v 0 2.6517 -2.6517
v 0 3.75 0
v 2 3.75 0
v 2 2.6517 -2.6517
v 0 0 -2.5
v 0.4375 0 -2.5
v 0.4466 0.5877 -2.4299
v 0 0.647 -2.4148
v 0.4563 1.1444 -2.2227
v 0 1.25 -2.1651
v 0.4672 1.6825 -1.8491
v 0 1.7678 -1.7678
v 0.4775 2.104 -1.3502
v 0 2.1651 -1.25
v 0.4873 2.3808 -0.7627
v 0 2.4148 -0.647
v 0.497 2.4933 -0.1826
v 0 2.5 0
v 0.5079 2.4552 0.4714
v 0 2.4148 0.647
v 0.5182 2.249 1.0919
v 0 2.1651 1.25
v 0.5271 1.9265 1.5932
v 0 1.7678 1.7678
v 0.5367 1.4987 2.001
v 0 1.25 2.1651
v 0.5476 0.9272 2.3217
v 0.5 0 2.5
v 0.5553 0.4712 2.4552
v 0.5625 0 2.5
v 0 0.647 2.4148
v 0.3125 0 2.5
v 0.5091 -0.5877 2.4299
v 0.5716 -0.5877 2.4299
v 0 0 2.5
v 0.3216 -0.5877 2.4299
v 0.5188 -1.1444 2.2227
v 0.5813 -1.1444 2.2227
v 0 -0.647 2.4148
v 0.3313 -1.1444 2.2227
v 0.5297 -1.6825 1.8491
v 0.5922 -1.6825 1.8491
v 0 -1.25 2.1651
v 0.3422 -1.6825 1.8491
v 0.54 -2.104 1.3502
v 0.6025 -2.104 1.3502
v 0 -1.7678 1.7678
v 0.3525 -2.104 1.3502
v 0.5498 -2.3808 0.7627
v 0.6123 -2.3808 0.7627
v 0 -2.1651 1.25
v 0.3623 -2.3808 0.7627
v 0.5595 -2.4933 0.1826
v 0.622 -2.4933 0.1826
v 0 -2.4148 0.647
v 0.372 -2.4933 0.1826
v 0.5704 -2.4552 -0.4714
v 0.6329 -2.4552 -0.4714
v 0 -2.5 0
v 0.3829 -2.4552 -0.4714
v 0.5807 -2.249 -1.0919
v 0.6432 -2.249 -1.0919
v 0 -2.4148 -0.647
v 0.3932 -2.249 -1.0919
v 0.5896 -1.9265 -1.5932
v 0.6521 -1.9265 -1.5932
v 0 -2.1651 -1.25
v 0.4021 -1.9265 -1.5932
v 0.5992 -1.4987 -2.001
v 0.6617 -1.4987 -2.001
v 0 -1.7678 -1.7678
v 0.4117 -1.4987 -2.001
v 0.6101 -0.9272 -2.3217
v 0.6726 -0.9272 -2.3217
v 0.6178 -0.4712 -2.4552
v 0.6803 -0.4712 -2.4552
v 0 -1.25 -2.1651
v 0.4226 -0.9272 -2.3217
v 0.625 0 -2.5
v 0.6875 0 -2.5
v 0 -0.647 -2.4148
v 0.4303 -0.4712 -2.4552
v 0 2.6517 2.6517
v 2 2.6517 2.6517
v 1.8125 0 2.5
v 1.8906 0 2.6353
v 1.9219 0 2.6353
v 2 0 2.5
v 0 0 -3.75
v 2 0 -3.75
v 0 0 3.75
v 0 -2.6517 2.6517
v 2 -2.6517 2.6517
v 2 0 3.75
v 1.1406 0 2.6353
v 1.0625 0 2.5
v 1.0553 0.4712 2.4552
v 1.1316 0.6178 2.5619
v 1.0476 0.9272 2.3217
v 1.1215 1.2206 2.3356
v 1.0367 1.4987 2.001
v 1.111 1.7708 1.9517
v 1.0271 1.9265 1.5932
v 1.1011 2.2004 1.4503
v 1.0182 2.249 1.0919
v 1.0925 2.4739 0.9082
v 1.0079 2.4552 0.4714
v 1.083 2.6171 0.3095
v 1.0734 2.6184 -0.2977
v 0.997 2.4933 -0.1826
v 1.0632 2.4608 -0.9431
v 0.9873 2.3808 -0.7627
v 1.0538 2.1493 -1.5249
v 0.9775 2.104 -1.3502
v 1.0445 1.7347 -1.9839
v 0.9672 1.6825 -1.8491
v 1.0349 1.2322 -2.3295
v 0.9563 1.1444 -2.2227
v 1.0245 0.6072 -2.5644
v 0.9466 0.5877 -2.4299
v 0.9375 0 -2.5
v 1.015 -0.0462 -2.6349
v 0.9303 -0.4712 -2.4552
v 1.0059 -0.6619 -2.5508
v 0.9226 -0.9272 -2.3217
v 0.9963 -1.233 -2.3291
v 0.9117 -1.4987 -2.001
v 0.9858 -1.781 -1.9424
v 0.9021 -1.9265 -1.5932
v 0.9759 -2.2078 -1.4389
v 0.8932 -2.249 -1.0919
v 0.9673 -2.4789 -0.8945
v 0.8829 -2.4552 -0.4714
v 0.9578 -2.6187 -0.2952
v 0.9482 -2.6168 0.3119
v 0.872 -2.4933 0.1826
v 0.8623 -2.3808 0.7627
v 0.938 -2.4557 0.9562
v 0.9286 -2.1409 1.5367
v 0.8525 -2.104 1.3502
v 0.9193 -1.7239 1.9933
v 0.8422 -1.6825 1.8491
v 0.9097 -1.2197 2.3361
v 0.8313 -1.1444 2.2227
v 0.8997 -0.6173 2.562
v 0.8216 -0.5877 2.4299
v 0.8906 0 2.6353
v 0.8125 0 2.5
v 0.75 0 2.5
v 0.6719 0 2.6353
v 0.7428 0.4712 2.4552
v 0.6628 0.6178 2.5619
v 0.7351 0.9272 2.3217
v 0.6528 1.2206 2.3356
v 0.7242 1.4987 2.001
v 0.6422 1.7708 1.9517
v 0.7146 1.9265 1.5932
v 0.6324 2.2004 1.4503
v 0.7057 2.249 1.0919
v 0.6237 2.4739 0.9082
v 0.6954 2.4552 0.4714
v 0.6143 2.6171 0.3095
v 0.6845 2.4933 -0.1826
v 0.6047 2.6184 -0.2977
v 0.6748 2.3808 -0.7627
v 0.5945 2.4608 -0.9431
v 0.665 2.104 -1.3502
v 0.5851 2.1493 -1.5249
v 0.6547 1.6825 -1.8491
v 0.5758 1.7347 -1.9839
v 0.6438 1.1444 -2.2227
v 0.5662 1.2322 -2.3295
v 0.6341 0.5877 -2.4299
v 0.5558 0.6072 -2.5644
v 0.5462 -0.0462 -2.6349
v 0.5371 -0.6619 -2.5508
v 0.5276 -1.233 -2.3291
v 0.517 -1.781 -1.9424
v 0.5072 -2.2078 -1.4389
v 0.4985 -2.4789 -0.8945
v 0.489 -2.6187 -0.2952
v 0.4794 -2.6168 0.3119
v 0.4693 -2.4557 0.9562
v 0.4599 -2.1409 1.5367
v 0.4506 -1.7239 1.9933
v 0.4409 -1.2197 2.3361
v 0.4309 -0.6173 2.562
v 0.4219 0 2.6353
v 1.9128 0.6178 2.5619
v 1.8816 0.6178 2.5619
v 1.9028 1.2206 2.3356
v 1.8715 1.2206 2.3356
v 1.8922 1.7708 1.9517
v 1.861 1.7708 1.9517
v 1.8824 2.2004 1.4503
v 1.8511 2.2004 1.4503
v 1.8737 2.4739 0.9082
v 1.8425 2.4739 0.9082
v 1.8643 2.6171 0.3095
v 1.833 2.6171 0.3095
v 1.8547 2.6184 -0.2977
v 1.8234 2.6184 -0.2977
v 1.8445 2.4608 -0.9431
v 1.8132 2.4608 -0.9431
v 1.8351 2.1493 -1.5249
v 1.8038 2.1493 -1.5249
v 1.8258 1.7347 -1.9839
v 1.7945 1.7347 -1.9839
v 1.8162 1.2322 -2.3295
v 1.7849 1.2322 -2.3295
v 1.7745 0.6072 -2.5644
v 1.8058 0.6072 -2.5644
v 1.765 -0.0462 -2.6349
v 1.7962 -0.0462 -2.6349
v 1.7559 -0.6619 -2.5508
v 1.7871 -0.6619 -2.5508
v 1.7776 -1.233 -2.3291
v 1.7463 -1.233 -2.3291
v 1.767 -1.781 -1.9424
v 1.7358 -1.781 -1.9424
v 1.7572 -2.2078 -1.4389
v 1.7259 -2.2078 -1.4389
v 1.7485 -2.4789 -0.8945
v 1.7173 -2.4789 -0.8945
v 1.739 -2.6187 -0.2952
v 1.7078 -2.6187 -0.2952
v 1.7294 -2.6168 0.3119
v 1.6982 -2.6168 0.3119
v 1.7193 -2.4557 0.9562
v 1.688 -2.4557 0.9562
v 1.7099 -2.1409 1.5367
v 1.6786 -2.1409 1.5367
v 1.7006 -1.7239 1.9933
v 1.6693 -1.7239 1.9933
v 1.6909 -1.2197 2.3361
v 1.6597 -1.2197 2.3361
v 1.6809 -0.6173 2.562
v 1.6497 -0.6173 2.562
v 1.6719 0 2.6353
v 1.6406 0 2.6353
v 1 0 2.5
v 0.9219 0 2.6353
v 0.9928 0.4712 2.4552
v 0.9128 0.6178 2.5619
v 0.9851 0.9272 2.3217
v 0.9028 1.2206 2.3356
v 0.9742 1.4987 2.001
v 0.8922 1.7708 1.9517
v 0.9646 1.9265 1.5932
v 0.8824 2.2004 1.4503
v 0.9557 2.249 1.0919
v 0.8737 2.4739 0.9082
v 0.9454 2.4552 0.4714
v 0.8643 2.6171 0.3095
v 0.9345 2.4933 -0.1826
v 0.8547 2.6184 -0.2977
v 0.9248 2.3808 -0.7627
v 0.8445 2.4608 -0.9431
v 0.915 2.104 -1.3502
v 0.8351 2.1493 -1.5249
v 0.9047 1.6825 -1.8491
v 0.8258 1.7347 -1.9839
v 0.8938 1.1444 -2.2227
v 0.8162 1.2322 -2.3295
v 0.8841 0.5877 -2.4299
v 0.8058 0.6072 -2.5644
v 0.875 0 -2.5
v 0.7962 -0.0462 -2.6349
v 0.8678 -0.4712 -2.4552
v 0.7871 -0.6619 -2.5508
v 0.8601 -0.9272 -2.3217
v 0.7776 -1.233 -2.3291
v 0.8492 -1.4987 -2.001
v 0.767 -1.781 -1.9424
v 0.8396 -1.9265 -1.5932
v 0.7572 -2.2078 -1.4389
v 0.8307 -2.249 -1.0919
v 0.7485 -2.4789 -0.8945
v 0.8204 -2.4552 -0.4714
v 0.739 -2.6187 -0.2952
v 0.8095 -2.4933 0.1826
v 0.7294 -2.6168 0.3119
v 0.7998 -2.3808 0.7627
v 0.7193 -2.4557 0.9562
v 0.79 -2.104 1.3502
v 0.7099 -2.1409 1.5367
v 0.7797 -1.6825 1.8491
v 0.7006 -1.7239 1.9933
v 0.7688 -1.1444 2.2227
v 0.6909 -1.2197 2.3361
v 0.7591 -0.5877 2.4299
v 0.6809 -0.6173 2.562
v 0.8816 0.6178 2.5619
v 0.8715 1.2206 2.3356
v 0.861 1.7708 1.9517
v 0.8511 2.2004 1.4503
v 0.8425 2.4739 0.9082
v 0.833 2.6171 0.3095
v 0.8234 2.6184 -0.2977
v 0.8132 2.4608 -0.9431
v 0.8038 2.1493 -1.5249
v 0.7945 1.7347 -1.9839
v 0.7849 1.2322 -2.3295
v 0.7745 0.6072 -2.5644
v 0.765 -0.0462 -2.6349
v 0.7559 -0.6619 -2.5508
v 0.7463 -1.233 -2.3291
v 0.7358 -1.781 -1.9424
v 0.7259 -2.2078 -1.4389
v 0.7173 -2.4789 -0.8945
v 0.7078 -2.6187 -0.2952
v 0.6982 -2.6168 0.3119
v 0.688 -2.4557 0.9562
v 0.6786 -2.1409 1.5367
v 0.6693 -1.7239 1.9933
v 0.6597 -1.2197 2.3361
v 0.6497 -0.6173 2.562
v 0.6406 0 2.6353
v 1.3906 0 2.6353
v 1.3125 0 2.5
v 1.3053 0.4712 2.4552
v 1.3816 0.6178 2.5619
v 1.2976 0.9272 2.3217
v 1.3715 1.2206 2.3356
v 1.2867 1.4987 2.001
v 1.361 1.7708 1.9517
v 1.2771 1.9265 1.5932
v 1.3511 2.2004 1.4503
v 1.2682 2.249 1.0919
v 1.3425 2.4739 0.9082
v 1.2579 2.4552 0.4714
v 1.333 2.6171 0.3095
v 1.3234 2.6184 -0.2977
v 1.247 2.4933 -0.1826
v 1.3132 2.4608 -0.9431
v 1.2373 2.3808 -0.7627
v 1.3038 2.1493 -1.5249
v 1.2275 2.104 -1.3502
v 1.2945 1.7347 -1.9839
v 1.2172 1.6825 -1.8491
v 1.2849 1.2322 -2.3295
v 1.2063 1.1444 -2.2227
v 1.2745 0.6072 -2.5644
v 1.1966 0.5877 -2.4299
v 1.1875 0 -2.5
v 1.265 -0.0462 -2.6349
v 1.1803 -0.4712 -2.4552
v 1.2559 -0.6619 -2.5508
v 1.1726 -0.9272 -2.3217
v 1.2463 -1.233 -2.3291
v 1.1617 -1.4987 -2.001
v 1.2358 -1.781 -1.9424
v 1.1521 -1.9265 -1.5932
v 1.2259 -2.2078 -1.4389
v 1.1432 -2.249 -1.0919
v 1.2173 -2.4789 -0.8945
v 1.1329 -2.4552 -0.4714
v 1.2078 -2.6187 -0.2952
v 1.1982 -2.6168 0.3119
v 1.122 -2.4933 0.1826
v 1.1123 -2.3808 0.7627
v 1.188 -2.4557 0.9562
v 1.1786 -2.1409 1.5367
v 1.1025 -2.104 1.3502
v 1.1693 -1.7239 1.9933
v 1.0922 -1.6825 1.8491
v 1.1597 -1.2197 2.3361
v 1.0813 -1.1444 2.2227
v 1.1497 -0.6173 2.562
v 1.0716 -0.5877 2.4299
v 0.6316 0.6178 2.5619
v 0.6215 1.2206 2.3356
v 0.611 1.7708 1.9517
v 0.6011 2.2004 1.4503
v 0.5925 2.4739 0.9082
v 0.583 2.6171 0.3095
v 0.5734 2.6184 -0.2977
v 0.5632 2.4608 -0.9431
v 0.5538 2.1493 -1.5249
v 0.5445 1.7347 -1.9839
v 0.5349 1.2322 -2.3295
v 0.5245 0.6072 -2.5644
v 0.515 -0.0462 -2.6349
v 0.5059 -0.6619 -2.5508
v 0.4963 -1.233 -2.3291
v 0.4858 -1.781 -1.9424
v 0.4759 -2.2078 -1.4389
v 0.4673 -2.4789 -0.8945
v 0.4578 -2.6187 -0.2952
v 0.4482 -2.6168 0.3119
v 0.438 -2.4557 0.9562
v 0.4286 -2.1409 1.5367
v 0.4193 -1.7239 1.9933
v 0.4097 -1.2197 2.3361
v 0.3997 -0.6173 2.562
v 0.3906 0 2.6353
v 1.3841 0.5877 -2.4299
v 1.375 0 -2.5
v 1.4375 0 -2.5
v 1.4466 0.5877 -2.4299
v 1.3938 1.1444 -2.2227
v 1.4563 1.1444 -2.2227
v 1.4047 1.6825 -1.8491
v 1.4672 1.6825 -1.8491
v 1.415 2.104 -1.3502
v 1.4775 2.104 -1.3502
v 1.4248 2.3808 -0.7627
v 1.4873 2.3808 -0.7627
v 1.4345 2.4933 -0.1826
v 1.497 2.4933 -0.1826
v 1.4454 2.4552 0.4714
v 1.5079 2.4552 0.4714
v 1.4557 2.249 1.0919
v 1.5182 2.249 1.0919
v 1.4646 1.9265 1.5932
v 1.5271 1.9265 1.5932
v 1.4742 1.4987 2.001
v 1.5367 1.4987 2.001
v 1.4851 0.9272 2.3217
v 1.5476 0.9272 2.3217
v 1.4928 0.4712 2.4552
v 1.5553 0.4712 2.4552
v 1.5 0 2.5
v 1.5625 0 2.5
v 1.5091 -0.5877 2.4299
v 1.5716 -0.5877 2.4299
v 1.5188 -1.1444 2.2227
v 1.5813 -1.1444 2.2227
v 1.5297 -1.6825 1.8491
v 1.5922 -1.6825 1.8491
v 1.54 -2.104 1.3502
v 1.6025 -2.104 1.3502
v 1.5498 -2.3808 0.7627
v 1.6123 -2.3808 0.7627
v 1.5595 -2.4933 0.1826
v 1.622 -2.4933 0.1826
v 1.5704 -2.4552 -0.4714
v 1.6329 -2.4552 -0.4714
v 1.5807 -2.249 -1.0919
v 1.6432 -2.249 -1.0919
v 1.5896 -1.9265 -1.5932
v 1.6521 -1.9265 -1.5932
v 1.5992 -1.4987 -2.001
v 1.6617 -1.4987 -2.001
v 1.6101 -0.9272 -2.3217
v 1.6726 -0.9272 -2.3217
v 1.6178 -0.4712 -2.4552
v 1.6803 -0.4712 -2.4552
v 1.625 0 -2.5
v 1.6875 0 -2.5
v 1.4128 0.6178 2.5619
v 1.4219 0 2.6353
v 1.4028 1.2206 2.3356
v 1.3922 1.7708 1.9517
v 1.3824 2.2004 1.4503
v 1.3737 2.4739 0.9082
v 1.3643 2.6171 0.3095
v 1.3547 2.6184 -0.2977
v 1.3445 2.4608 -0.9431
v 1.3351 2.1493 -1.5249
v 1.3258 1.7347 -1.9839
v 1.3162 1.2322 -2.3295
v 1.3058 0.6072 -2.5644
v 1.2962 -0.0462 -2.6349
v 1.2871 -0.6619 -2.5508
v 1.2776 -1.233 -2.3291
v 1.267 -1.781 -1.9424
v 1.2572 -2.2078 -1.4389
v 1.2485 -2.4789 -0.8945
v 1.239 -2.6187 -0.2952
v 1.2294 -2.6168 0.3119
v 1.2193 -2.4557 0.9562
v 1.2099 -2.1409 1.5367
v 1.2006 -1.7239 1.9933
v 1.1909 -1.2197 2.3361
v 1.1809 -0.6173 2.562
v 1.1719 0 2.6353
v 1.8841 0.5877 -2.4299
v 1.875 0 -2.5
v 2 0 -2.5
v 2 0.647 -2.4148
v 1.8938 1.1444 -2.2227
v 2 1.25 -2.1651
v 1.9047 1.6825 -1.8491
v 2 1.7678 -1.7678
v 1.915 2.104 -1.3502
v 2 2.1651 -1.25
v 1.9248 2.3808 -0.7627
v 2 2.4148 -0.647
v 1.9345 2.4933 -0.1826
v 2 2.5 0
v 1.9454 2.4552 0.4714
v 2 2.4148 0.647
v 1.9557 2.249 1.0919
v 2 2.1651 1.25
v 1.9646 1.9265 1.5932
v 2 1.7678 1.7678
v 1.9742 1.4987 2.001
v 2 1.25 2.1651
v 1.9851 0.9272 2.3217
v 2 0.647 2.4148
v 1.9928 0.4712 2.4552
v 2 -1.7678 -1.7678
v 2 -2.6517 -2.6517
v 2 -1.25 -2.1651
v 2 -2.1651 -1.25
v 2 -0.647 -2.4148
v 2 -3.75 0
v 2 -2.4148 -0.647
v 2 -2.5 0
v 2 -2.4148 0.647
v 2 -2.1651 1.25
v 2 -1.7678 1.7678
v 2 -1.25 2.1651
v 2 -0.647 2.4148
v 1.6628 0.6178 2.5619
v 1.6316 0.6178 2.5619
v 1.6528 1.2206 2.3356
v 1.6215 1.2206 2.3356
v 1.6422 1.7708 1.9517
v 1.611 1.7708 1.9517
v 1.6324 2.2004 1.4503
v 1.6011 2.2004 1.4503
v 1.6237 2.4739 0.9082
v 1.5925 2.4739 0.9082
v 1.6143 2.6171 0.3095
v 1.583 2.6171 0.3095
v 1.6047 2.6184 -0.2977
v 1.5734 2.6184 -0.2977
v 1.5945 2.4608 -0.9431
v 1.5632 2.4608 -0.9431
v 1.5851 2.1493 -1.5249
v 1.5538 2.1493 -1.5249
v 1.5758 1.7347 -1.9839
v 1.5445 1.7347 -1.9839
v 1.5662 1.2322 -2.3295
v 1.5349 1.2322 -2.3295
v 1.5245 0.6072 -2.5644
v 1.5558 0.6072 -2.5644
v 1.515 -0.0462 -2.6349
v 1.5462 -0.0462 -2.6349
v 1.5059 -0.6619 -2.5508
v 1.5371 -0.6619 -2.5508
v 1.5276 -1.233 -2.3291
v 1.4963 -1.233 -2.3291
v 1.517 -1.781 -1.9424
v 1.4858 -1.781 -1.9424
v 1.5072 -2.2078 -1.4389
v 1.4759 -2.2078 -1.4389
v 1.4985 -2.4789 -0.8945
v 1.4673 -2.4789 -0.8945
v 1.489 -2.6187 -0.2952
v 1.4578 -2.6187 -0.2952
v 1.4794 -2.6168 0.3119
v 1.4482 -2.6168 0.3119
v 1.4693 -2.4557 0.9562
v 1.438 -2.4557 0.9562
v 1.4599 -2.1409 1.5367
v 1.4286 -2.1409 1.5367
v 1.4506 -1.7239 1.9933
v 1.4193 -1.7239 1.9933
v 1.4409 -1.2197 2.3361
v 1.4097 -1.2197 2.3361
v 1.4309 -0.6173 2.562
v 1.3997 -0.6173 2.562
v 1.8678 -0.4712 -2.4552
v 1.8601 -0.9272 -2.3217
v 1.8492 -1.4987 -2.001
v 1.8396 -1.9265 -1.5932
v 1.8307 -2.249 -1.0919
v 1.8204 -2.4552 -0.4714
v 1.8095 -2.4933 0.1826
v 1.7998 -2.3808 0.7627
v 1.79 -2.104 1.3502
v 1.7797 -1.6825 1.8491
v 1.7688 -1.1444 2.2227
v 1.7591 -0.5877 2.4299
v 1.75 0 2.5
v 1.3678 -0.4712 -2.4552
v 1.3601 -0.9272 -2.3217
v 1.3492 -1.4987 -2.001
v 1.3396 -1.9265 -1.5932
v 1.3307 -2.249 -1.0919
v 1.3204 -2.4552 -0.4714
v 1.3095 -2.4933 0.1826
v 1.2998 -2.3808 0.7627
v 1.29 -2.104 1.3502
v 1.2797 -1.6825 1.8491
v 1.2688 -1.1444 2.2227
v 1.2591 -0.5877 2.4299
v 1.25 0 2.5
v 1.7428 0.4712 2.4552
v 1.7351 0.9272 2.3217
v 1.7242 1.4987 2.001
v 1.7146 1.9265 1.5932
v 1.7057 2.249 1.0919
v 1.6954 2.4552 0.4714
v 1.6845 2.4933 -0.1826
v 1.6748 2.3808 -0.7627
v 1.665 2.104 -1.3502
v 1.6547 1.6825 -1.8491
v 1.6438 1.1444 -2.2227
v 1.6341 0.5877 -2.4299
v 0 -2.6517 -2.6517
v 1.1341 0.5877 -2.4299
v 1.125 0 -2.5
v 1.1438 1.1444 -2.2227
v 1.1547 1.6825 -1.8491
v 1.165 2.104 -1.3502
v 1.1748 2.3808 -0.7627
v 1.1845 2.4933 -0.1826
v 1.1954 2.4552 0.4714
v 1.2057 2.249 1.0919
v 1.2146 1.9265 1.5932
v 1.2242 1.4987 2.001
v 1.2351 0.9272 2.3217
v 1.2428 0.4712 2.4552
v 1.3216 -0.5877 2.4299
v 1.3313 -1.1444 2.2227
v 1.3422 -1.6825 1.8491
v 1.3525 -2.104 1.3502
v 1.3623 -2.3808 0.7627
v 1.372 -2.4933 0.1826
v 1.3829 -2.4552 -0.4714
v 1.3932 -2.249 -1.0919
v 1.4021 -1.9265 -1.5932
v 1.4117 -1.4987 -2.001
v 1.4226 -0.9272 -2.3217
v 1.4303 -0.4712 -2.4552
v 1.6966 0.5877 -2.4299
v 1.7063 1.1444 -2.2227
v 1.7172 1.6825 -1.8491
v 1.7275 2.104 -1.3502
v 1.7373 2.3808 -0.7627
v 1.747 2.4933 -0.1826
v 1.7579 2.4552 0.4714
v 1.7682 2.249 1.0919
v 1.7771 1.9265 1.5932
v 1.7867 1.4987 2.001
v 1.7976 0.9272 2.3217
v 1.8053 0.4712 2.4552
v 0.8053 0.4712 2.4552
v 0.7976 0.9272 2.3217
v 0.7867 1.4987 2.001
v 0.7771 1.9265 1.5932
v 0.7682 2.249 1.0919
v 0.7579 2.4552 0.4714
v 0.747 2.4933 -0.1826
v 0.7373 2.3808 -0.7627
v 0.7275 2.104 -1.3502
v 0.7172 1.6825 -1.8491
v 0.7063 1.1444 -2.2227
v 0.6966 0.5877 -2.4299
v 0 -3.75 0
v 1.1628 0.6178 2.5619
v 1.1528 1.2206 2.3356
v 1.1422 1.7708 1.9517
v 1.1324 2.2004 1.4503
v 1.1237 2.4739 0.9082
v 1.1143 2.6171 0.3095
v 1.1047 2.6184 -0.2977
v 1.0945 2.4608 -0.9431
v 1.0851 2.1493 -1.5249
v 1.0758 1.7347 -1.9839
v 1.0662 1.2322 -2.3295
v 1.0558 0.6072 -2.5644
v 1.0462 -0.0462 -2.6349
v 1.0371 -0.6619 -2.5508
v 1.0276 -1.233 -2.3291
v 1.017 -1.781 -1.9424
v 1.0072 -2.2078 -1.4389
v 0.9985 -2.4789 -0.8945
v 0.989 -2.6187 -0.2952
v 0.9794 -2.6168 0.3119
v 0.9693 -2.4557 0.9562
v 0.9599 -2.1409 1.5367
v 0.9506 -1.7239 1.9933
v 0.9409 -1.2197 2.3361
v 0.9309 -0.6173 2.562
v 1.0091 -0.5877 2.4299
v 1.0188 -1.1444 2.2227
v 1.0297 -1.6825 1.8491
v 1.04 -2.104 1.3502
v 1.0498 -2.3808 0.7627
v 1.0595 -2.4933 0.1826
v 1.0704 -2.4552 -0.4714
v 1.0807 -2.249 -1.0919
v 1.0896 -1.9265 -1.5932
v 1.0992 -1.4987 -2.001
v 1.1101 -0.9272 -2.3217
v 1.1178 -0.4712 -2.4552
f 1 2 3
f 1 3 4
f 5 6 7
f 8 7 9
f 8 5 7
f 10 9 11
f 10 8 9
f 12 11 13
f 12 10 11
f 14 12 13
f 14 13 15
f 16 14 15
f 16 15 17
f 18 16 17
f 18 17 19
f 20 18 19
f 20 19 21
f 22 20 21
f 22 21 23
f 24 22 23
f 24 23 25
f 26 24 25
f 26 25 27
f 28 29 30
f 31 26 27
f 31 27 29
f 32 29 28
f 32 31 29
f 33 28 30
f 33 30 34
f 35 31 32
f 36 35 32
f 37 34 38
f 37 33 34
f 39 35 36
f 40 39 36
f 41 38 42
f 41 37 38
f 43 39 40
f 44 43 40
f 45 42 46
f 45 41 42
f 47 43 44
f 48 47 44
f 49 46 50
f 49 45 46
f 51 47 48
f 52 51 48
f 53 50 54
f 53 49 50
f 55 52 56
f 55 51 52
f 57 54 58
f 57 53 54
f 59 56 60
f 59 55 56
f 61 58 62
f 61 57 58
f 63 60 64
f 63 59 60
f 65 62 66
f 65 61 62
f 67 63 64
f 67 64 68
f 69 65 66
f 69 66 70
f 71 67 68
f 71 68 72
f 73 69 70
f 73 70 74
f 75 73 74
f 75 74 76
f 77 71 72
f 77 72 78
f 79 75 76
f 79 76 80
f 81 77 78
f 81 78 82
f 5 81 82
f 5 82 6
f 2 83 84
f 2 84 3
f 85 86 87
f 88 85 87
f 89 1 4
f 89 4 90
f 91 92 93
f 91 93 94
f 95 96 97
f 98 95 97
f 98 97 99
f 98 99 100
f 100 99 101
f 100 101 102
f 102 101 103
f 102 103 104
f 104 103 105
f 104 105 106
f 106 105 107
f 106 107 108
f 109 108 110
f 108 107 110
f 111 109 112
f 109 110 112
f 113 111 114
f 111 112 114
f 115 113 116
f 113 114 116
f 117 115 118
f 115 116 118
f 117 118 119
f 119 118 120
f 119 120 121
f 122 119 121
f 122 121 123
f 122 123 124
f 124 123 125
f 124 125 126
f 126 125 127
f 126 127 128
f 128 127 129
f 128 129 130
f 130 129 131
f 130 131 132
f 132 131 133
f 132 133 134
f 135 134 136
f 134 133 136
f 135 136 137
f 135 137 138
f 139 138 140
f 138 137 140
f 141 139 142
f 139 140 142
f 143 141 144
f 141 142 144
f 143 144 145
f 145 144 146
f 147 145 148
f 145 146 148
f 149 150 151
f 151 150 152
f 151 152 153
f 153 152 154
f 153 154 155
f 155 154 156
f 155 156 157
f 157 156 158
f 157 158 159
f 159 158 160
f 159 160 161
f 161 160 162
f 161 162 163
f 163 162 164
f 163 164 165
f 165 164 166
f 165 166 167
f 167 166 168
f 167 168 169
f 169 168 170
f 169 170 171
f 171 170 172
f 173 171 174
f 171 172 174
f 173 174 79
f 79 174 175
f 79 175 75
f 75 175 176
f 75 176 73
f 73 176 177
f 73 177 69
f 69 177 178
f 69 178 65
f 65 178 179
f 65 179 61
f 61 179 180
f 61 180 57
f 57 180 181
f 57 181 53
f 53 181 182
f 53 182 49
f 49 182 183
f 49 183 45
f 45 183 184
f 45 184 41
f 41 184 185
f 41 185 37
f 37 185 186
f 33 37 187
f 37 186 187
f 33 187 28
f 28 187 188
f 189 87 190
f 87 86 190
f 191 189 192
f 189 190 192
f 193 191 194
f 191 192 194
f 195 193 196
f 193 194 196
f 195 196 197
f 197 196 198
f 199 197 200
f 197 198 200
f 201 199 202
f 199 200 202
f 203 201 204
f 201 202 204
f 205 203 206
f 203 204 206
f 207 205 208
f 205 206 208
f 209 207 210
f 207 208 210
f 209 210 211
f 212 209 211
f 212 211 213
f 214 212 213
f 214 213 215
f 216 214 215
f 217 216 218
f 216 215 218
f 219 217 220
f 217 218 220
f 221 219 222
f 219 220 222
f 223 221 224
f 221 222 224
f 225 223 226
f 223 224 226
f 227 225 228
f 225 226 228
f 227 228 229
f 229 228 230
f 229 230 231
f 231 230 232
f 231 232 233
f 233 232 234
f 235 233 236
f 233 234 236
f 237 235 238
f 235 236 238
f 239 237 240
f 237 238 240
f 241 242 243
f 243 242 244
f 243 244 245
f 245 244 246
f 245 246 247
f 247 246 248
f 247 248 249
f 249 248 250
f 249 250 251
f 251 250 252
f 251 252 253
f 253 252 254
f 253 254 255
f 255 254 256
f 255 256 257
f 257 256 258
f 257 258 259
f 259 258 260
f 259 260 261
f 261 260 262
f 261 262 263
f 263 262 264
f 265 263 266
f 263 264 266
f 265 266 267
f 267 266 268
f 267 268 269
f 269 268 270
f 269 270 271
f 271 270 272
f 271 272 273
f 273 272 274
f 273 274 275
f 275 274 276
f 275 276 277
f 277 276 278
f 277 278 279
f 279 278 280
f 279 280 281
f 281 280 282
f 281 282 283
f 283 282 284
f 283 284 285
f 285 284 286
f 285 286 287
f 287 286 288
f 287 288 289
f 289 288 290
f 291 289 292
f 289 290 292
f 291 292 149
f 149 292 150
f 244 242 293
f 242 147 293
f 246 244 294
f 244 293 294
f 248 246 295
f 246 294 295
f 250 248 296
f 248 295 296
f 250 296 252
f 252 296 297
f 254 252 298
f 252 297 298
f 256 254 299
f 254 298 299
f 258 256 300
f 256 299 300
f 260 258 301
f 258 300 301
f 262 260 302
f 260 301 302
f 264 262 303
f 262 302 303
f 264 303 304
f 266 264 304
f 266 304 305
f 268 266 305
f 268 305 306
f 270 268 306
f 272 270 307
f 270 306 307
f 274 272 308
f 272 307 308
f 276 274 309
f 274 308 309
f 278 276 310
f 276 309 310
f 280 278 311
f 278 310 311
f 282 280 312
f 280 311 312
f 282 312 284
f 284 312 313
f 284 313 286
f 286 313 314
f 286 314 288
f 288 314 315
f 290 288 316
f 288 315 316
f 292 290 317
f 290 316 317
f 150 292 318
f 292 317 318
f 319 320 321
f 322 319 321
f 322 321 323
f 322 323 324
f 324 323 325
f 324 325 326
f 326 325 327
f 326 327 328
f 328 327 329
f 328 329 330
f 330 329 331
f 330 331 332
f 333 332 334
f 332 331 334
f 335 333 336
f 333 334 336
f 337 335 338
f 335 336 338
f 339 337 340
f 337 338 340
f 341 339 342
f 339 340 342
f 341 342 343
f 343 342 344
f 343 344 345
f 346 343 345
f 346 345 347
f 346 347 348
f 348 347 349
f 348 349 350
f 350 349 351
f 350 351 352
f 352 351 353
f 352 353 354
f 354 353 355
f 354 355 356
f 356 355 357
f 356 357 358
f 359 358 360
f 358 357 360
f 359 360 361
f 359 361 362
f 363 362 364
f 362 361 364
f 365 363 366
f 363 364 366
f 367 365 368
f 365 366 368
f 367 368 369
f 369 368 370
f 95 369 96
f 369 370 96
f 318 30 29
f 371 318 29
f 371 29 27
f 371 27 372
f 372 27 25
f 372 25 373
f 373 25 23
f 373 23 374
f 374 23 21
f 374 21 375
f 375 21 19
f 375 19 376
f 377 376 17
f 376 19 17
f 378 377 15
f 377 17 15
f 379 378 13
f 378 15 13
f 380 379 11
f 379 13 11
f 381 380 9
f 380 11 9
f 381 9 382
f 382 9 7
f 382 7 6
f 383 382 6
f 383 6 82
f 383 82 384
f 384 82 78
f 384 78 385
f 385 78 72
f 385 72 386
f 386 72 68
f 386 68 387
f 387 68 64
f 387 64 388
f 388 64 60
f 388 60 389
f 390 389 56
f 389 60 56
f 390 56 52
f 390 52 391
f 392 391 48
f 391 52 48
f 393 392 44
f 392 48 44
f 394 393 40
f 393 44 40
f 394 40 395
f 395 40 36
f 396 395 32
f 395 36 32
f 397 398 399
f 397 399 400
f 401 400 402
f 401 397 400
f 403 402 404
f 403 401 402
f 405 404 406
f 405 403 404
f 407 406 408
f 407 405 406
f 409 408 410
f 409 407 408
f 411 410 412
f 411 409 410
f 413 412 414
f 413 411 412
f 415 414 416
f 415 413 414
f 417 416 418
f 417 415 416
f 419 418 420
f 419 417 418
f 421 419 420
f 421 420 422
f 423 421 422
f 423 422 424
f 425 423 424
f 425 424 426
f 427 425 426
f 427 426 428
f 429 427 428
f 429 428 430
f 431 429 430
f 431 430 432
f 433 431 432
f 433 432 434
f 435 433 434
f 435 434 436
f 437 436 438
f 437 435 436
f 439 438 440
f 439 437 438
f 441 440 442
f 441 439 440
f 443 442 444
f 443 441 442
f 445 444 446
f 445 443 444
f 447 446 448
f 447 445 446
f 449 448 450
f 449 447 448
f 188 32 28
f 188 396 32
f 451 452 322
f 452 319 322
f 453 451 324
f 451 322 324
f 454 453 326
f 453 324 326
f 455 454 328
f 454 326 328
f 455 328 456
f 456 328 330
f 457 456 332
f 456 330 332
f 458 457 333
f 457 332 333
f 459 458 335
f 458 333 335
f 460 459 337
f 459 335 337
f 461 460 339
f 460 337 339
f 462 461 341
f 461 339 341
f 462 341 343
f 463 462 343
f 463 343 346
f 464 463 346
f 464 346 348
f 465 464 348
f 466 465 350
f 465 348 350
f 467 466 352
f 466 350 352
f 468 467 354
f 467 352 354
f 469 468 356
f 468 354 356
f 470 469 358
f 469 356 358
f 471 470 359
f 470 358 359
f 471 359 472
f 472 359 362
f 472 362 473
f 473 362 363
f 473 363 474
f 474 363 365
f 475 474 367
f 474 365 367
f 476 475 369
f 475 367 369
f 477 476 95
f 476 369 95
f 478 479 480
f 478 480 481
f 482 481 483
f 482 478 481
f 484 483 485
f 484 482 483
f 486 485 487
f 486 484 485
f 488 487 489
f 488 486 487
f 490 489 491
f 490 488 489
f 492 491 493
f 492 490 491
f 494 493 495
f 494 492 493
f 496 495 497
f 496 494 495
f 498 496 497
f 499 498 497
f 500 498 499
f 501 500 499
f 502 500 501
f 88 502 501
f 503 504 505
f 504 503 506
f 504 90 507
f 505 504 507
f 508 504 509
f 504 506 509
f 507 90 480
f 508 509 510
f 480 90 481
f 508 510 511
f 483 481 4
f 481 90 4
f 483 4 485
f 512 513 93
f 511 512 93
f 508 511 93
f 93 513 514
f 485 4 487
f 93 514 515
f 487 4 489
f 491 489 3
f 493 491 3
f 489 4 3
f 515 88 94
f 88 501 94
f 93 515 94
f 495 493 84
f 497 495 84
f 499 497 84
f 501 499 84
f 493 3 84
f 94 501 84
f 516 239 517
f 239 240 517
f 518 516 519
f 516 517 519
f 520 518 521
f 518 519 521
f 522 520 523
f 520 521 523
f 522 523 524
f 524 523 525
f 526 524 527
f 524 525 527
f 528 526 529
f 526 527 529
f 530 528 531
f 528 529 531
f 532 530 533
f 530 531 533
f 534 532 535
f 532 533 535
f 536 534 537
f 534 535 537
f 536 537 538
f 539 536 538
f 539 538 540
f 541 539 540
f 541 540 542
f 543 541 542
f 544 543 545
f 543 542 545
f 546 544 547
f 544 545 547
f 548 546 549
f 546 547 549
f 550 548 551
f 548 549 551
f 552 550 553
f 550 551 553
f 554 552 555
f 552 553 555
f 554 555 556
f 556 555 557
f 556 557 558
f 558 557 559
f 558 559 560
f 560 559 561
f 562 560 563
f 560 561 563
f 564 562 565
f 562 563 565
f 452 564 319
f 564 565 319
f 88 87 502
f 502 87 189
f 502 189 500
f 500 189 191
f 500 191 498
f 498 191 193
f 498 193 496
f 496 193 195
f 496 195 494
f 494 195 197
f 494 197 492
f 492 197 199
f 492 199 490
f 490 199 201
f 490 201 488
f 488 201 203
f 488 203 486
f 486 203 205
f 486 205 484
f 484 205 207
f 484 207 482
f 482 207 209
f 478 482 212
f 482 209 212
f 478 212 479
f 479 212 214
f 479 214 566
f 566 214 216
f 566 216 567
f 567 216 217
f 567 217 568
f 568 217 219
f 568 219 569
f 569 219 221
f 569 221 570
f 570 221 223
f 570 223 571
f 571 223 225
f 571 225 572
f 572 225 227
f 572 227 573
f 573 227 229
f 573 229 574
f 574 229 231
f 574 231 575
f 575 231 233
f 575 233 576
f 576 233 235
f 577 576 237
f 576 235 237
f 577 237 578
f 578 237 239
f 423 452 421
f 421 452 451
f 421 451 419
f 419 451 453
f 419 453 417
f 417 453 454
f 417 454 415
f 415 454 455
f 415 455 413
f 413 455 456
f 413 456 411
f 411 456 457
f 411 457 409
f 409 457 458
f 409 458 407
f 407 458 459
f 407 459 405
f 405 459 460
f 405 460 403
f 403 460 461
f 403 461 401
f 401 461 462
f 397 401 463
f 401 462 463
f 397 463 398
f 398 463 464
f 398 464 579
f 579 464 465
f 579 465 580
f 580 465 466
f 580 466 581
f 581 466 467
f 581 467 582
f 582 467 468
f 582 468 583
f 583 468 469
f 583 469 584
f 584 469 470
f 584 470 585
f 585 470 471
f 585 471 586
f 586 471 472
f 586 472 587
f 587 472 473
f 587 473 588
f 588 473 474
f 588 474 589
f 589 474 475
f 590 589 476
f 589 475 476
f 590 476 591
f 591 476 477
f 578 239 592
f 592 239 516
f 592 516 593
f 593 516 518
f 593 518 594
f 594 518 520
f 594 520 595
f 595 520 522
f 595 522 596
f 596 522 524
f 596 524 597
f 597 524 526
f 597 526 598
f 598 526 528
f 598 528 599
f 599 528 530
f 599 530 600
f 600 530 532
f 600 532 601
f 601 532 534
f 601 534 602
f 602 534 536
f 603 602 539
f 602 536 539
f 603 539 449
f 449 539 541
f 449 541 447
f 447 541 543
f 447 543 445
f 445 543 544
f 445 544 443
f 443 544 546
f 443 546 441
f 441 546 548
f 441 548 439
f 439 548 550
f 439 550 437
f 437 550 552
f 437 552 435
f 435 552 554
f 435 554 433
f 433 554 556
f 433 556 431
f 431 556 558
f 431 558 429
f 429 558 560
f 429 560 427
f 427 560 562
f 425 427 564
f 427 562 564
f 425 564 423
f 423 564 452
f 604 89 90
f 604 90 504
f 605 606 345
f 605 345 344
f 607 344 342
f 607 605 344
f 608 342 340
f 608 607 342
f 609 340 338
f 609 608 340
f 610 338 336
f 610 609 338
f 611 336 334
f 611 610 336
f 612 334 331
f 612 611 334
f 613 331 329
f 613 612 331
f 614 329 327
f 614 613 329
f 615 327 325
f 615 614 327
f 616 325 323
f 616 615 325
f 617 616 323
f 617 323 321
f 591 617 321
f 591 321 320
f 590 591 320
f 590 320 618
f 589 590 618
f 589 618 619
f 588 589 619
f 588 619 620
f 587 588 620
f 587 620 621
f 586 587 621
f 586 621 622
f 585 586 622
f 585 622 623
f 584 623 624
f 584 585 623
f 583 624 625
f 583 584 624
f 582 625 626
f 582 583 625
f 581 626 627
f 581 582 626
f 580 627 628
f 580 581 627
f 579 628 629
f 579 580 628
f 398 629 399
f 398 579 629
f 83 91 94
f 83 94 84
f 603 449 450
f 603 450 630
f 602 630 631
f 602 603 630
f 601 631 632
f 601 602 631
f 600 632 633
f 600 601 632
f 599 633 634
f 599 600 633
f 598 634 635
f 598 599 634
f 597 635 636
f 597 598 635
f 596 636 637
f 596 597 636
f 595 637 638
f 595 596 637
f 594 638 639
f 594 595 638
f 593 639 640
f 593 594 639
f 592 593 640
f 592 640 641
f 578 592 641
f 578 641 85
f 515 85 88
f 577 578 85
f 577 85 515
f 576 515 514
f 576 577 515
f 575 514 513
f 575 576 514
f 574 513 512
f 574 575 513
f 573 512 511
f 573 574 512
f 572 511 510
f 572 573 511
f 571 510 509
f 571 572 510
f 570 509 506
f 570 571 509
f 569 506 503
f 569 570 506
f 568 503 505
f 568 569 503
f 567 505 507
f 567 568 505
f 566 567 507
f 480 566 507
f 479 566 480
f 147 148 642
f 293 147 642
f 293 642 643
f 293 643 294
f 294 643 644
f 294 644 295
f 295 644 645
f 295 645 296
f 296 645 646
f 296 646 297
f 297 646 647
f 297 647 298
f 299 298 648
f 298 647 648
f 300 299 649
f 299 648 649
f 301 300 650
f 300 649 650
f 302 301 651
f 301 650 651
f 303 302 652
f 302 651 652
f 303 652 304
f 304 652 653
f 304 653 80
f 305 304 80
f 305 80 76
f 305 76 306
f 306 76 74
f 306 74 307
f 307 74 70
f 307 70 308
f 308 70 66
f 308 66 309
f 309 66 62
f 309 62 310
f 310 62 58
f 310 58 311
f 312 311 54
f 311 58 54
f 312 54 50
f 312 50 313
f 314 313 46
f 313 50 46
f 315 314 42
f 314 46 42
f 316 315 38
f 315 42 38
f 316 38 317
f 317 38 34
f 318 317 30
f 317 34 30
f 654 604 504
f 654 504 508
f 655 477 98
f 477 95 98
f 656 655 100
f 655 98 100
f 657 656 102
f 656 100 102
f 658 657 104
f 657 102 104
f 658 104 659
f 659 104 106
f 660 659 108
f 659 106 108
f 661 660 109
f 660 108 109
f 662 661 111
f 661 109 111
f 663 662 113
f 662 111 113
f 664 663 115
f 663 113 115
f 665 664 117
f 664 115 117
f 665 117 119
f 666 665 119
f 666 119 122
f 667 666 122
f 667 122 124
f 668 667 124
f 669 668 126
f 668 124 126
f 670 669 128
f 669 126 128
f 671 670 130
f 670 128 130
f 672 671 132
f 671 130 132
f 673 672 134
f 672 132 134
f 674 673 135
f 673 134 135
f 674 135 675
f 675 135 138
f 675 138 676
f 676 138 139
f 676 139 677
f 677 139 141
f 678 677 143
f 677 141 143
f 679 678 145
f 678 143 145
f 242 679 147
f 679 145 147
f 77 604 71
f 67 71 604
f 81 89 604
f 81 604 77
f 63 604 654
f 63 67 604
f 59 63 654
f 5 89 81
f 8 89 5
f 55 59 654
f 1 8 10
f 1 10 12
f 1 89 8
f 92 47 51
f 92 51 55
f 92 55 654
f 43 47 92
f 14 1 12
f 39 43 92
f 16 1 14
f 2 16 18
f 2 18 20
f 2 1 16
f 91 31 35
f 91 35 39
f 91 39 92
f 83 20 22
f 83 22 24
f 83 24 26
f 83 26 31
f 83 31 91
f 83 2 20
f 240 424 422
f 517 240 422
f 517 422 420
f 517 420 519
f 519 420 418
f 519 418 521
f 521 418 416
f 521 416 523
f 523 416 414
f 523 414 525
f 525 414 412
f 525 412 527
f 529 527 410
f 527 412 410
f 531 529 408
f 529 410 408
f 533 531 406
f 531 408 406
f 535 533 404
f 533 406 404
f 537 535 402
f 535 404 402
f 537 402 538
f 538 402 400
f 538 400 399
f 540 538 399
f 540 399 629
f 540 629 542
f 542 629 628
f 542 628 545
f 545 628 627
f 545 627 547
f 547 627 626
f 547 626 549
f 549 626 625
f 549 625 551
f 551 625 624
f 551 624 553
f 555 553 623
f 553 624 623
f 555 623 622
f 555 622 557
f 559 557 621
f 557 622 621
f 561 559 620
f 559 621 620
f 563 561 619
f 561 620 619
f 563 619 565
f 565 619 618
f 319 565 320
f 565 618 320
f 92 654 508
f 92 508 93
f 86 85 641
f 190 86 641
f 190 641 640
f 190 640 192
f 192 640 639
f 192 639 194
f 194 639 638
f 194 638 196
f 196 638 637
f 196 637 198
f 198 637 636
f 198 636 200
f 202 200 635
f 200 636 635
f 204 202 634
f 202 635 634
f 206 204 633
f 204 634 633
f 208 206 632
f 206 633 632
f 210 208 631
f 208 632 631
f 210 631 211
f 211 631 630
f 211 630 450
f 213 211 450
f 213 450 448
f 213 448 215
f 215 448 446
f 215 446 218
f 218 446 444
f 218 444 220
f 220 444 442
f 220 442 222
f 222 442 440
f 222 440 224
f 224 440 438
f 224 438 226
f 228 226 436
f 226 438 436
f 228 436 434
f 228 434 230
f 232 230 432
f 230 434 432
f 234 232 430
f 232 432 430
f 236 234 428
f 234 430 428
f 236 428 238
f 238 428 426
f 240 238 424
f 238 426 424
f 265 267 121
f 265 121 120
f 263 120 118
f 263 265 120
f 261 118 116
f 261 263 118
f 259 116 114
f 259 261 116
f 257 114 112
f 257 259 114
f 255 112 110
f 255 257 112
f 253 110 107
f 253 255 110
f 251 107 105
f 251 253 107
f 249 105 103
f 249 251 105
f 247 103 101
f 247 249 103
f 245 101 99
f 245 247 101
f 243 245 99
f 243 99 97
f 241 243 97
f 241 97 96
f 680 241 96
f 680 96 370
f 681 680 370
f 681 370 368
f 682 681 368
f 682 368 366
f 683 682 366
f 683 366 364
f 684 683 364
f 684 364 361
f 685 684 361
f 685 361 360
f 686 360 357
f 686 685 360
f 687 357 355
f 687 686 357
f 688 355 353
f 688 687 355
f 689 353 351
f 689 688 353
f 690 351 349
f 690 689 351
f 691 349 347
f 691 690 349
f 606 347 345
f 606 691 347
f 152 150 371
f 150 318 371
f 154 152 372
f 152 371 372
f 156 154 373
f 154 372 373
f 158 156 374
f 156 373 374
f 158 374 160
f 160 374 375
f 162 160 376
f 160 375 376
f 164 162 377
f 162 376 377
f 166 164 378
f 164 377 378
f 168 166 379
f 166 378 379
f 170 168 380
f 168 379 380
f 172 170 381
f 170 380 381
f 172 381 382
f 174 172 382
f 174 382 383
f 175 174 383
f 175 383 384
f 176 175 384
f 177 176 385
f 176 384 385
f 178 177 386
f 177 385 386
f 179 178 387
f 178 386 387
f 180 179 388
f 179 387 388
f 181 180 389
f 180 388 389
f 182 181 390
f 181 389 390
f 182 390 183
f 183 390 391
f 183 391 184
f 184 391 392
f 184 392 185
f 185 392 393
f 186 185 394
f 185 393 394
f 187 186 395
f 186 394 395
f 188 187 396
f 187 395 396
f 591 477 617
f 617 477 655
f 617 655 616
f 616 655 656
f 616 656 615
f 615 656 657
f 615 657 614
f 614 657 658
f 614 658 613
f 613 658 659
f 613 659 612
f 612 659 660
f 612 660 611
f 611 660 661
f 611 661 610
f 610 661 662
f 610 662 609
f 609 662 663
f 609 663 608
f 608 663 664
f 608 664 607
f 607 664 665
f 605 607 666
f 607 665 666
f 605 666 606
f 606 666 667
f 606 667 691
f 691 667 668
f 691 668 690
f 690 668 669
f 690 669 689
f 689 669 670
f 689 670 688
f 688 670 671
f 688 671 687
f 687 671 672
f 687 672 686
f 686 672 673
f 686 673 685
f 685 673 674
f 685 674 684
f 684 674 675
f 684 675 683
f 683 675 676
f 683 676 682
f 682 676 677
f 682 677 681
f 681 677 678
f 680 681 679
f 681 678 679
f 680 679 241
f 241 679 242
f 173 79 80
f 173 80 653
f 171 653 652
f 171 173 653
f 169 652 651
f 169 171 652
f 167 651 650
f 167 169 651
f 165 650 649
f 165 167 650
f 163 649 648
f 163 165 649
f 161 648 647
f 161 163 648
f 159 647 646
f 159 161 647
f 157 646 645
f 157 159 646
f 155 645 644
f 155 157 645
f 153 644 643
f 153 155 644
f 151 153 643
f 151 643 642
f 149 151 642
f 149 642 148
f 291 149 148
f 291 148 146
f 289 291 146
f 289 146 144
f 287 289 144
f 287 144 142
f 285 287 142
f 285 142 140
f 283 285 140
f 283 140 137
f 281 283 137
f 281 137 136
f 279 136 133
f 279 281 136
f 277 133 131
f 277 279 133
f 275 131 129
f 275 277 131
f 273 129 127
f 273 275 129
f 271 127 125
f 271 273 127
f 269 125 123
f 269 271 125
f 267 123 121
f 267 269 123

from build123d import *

# Parameters (mm, degrees)
SKETCH1_R           = 2.5
BOSS_EXTRUDE1_DEPTH = 2
THREAD1_PITCH       = 0.25


with BuildPart() as part:
    # Sketch1 → Boss-Extrude1 (new body)
    with BuildSketch(Plane(origin=(0, 0, 0), x_dir=(0, 0, -1), z_dir=(1, 0, 0))):
        Polygon((-2.651650429, 2.651650429), (0, 3.75), (2.651650429, 2.651650429), (3.75, 0), (2.651650429, -2.651650429), (0, -3.75), (-2.651650429, -2.651650429), (-3.75, 0), align=None)
        Circle(SKETCH1_R, mode=Mode.SUBTRACT)
    extrude(amount=BOSS_EXTRUDE1_DEPTH)

    # Thread1: the profile of Thread Profile1 profile screwed along a right-hand helix of 6 turns, 6 arcs to a turn; built about Z, then put on its axis
    thread1_z = Axis((0, 0, 0), (0, 0, 1))
    thread1_corners = [(2.4997, 0, -0.000173205), (2.635316469, 0, 0.078125), (2.635316469, 0, 0.109375), (2.4997, 0, 0.187673204)]
    with BuildLine(mode=Mode.PRIVATE) as thread1_profile:
        Line(thread1_corners[0], thread1_corners[1])
        Line(thread1_corners[1], thread1_corners[2])
        Line(thread1_corners[2], thread1_corners[3])
        Line(thread1_corners[3], thread1_corners[0])
    thread1_cap = Face(thread1_profile.wire())
    thread1_turn_angles = [0, 30, 60, 90, 120, 150, 180, 210, 240, 270, 300, 330, 360]
    thread1_turn_weights = [1, 0.8660254037844387, 1, 0.8660254037844387, 1, 0.8660254037844387, 1, 0.8660254037844387, 1, 0.8660254037844387, 1, 0.8660254037844387, 1]
    thread1_turn_rails = [Edge.make_bspline([Vector(p[0], p[1], 0).rotate(thread1_z, thread1_turn_angles[k]) / thread1_turn_weights[k] + Vector(0, 0, p[2] + THREAD1_PITCH * thread1_turn_angles[k] / 360) for k in range(13)], [0, 0, 0, 1, 1, 2, 2, 3, 3, 4, 4, 5, 5, 6, 6, 6], 2, thread1_turn_weights) for p in thread1_corners]
    thread1_turn_sides = [Face.make_surface_from_curves(thread1_turn_rails[p[0]], thread1_turn_rails[p[1]]) for p in [(0, 1), (1, 2), (2, 3), (3, 0)]]
    thread1 = Plane(origin=(2, 0, 0), x_dir=(0, 0, 1), z_dir=(-1, 0, 0)) * Solid(Shell([*[p.moved(Location((0, 0, THREAD1_PITCH * i))) for i in range(6) for p in thread1_turn_sides], thread1_cap, thread1_cap.rotate(thread1_z, 2160).moved(Location((0, 0, THREAD1_PITCH * 2160 / 360)))]))
    add(thread1, mode=Mode.SUBTRACT)


solid = part.part
